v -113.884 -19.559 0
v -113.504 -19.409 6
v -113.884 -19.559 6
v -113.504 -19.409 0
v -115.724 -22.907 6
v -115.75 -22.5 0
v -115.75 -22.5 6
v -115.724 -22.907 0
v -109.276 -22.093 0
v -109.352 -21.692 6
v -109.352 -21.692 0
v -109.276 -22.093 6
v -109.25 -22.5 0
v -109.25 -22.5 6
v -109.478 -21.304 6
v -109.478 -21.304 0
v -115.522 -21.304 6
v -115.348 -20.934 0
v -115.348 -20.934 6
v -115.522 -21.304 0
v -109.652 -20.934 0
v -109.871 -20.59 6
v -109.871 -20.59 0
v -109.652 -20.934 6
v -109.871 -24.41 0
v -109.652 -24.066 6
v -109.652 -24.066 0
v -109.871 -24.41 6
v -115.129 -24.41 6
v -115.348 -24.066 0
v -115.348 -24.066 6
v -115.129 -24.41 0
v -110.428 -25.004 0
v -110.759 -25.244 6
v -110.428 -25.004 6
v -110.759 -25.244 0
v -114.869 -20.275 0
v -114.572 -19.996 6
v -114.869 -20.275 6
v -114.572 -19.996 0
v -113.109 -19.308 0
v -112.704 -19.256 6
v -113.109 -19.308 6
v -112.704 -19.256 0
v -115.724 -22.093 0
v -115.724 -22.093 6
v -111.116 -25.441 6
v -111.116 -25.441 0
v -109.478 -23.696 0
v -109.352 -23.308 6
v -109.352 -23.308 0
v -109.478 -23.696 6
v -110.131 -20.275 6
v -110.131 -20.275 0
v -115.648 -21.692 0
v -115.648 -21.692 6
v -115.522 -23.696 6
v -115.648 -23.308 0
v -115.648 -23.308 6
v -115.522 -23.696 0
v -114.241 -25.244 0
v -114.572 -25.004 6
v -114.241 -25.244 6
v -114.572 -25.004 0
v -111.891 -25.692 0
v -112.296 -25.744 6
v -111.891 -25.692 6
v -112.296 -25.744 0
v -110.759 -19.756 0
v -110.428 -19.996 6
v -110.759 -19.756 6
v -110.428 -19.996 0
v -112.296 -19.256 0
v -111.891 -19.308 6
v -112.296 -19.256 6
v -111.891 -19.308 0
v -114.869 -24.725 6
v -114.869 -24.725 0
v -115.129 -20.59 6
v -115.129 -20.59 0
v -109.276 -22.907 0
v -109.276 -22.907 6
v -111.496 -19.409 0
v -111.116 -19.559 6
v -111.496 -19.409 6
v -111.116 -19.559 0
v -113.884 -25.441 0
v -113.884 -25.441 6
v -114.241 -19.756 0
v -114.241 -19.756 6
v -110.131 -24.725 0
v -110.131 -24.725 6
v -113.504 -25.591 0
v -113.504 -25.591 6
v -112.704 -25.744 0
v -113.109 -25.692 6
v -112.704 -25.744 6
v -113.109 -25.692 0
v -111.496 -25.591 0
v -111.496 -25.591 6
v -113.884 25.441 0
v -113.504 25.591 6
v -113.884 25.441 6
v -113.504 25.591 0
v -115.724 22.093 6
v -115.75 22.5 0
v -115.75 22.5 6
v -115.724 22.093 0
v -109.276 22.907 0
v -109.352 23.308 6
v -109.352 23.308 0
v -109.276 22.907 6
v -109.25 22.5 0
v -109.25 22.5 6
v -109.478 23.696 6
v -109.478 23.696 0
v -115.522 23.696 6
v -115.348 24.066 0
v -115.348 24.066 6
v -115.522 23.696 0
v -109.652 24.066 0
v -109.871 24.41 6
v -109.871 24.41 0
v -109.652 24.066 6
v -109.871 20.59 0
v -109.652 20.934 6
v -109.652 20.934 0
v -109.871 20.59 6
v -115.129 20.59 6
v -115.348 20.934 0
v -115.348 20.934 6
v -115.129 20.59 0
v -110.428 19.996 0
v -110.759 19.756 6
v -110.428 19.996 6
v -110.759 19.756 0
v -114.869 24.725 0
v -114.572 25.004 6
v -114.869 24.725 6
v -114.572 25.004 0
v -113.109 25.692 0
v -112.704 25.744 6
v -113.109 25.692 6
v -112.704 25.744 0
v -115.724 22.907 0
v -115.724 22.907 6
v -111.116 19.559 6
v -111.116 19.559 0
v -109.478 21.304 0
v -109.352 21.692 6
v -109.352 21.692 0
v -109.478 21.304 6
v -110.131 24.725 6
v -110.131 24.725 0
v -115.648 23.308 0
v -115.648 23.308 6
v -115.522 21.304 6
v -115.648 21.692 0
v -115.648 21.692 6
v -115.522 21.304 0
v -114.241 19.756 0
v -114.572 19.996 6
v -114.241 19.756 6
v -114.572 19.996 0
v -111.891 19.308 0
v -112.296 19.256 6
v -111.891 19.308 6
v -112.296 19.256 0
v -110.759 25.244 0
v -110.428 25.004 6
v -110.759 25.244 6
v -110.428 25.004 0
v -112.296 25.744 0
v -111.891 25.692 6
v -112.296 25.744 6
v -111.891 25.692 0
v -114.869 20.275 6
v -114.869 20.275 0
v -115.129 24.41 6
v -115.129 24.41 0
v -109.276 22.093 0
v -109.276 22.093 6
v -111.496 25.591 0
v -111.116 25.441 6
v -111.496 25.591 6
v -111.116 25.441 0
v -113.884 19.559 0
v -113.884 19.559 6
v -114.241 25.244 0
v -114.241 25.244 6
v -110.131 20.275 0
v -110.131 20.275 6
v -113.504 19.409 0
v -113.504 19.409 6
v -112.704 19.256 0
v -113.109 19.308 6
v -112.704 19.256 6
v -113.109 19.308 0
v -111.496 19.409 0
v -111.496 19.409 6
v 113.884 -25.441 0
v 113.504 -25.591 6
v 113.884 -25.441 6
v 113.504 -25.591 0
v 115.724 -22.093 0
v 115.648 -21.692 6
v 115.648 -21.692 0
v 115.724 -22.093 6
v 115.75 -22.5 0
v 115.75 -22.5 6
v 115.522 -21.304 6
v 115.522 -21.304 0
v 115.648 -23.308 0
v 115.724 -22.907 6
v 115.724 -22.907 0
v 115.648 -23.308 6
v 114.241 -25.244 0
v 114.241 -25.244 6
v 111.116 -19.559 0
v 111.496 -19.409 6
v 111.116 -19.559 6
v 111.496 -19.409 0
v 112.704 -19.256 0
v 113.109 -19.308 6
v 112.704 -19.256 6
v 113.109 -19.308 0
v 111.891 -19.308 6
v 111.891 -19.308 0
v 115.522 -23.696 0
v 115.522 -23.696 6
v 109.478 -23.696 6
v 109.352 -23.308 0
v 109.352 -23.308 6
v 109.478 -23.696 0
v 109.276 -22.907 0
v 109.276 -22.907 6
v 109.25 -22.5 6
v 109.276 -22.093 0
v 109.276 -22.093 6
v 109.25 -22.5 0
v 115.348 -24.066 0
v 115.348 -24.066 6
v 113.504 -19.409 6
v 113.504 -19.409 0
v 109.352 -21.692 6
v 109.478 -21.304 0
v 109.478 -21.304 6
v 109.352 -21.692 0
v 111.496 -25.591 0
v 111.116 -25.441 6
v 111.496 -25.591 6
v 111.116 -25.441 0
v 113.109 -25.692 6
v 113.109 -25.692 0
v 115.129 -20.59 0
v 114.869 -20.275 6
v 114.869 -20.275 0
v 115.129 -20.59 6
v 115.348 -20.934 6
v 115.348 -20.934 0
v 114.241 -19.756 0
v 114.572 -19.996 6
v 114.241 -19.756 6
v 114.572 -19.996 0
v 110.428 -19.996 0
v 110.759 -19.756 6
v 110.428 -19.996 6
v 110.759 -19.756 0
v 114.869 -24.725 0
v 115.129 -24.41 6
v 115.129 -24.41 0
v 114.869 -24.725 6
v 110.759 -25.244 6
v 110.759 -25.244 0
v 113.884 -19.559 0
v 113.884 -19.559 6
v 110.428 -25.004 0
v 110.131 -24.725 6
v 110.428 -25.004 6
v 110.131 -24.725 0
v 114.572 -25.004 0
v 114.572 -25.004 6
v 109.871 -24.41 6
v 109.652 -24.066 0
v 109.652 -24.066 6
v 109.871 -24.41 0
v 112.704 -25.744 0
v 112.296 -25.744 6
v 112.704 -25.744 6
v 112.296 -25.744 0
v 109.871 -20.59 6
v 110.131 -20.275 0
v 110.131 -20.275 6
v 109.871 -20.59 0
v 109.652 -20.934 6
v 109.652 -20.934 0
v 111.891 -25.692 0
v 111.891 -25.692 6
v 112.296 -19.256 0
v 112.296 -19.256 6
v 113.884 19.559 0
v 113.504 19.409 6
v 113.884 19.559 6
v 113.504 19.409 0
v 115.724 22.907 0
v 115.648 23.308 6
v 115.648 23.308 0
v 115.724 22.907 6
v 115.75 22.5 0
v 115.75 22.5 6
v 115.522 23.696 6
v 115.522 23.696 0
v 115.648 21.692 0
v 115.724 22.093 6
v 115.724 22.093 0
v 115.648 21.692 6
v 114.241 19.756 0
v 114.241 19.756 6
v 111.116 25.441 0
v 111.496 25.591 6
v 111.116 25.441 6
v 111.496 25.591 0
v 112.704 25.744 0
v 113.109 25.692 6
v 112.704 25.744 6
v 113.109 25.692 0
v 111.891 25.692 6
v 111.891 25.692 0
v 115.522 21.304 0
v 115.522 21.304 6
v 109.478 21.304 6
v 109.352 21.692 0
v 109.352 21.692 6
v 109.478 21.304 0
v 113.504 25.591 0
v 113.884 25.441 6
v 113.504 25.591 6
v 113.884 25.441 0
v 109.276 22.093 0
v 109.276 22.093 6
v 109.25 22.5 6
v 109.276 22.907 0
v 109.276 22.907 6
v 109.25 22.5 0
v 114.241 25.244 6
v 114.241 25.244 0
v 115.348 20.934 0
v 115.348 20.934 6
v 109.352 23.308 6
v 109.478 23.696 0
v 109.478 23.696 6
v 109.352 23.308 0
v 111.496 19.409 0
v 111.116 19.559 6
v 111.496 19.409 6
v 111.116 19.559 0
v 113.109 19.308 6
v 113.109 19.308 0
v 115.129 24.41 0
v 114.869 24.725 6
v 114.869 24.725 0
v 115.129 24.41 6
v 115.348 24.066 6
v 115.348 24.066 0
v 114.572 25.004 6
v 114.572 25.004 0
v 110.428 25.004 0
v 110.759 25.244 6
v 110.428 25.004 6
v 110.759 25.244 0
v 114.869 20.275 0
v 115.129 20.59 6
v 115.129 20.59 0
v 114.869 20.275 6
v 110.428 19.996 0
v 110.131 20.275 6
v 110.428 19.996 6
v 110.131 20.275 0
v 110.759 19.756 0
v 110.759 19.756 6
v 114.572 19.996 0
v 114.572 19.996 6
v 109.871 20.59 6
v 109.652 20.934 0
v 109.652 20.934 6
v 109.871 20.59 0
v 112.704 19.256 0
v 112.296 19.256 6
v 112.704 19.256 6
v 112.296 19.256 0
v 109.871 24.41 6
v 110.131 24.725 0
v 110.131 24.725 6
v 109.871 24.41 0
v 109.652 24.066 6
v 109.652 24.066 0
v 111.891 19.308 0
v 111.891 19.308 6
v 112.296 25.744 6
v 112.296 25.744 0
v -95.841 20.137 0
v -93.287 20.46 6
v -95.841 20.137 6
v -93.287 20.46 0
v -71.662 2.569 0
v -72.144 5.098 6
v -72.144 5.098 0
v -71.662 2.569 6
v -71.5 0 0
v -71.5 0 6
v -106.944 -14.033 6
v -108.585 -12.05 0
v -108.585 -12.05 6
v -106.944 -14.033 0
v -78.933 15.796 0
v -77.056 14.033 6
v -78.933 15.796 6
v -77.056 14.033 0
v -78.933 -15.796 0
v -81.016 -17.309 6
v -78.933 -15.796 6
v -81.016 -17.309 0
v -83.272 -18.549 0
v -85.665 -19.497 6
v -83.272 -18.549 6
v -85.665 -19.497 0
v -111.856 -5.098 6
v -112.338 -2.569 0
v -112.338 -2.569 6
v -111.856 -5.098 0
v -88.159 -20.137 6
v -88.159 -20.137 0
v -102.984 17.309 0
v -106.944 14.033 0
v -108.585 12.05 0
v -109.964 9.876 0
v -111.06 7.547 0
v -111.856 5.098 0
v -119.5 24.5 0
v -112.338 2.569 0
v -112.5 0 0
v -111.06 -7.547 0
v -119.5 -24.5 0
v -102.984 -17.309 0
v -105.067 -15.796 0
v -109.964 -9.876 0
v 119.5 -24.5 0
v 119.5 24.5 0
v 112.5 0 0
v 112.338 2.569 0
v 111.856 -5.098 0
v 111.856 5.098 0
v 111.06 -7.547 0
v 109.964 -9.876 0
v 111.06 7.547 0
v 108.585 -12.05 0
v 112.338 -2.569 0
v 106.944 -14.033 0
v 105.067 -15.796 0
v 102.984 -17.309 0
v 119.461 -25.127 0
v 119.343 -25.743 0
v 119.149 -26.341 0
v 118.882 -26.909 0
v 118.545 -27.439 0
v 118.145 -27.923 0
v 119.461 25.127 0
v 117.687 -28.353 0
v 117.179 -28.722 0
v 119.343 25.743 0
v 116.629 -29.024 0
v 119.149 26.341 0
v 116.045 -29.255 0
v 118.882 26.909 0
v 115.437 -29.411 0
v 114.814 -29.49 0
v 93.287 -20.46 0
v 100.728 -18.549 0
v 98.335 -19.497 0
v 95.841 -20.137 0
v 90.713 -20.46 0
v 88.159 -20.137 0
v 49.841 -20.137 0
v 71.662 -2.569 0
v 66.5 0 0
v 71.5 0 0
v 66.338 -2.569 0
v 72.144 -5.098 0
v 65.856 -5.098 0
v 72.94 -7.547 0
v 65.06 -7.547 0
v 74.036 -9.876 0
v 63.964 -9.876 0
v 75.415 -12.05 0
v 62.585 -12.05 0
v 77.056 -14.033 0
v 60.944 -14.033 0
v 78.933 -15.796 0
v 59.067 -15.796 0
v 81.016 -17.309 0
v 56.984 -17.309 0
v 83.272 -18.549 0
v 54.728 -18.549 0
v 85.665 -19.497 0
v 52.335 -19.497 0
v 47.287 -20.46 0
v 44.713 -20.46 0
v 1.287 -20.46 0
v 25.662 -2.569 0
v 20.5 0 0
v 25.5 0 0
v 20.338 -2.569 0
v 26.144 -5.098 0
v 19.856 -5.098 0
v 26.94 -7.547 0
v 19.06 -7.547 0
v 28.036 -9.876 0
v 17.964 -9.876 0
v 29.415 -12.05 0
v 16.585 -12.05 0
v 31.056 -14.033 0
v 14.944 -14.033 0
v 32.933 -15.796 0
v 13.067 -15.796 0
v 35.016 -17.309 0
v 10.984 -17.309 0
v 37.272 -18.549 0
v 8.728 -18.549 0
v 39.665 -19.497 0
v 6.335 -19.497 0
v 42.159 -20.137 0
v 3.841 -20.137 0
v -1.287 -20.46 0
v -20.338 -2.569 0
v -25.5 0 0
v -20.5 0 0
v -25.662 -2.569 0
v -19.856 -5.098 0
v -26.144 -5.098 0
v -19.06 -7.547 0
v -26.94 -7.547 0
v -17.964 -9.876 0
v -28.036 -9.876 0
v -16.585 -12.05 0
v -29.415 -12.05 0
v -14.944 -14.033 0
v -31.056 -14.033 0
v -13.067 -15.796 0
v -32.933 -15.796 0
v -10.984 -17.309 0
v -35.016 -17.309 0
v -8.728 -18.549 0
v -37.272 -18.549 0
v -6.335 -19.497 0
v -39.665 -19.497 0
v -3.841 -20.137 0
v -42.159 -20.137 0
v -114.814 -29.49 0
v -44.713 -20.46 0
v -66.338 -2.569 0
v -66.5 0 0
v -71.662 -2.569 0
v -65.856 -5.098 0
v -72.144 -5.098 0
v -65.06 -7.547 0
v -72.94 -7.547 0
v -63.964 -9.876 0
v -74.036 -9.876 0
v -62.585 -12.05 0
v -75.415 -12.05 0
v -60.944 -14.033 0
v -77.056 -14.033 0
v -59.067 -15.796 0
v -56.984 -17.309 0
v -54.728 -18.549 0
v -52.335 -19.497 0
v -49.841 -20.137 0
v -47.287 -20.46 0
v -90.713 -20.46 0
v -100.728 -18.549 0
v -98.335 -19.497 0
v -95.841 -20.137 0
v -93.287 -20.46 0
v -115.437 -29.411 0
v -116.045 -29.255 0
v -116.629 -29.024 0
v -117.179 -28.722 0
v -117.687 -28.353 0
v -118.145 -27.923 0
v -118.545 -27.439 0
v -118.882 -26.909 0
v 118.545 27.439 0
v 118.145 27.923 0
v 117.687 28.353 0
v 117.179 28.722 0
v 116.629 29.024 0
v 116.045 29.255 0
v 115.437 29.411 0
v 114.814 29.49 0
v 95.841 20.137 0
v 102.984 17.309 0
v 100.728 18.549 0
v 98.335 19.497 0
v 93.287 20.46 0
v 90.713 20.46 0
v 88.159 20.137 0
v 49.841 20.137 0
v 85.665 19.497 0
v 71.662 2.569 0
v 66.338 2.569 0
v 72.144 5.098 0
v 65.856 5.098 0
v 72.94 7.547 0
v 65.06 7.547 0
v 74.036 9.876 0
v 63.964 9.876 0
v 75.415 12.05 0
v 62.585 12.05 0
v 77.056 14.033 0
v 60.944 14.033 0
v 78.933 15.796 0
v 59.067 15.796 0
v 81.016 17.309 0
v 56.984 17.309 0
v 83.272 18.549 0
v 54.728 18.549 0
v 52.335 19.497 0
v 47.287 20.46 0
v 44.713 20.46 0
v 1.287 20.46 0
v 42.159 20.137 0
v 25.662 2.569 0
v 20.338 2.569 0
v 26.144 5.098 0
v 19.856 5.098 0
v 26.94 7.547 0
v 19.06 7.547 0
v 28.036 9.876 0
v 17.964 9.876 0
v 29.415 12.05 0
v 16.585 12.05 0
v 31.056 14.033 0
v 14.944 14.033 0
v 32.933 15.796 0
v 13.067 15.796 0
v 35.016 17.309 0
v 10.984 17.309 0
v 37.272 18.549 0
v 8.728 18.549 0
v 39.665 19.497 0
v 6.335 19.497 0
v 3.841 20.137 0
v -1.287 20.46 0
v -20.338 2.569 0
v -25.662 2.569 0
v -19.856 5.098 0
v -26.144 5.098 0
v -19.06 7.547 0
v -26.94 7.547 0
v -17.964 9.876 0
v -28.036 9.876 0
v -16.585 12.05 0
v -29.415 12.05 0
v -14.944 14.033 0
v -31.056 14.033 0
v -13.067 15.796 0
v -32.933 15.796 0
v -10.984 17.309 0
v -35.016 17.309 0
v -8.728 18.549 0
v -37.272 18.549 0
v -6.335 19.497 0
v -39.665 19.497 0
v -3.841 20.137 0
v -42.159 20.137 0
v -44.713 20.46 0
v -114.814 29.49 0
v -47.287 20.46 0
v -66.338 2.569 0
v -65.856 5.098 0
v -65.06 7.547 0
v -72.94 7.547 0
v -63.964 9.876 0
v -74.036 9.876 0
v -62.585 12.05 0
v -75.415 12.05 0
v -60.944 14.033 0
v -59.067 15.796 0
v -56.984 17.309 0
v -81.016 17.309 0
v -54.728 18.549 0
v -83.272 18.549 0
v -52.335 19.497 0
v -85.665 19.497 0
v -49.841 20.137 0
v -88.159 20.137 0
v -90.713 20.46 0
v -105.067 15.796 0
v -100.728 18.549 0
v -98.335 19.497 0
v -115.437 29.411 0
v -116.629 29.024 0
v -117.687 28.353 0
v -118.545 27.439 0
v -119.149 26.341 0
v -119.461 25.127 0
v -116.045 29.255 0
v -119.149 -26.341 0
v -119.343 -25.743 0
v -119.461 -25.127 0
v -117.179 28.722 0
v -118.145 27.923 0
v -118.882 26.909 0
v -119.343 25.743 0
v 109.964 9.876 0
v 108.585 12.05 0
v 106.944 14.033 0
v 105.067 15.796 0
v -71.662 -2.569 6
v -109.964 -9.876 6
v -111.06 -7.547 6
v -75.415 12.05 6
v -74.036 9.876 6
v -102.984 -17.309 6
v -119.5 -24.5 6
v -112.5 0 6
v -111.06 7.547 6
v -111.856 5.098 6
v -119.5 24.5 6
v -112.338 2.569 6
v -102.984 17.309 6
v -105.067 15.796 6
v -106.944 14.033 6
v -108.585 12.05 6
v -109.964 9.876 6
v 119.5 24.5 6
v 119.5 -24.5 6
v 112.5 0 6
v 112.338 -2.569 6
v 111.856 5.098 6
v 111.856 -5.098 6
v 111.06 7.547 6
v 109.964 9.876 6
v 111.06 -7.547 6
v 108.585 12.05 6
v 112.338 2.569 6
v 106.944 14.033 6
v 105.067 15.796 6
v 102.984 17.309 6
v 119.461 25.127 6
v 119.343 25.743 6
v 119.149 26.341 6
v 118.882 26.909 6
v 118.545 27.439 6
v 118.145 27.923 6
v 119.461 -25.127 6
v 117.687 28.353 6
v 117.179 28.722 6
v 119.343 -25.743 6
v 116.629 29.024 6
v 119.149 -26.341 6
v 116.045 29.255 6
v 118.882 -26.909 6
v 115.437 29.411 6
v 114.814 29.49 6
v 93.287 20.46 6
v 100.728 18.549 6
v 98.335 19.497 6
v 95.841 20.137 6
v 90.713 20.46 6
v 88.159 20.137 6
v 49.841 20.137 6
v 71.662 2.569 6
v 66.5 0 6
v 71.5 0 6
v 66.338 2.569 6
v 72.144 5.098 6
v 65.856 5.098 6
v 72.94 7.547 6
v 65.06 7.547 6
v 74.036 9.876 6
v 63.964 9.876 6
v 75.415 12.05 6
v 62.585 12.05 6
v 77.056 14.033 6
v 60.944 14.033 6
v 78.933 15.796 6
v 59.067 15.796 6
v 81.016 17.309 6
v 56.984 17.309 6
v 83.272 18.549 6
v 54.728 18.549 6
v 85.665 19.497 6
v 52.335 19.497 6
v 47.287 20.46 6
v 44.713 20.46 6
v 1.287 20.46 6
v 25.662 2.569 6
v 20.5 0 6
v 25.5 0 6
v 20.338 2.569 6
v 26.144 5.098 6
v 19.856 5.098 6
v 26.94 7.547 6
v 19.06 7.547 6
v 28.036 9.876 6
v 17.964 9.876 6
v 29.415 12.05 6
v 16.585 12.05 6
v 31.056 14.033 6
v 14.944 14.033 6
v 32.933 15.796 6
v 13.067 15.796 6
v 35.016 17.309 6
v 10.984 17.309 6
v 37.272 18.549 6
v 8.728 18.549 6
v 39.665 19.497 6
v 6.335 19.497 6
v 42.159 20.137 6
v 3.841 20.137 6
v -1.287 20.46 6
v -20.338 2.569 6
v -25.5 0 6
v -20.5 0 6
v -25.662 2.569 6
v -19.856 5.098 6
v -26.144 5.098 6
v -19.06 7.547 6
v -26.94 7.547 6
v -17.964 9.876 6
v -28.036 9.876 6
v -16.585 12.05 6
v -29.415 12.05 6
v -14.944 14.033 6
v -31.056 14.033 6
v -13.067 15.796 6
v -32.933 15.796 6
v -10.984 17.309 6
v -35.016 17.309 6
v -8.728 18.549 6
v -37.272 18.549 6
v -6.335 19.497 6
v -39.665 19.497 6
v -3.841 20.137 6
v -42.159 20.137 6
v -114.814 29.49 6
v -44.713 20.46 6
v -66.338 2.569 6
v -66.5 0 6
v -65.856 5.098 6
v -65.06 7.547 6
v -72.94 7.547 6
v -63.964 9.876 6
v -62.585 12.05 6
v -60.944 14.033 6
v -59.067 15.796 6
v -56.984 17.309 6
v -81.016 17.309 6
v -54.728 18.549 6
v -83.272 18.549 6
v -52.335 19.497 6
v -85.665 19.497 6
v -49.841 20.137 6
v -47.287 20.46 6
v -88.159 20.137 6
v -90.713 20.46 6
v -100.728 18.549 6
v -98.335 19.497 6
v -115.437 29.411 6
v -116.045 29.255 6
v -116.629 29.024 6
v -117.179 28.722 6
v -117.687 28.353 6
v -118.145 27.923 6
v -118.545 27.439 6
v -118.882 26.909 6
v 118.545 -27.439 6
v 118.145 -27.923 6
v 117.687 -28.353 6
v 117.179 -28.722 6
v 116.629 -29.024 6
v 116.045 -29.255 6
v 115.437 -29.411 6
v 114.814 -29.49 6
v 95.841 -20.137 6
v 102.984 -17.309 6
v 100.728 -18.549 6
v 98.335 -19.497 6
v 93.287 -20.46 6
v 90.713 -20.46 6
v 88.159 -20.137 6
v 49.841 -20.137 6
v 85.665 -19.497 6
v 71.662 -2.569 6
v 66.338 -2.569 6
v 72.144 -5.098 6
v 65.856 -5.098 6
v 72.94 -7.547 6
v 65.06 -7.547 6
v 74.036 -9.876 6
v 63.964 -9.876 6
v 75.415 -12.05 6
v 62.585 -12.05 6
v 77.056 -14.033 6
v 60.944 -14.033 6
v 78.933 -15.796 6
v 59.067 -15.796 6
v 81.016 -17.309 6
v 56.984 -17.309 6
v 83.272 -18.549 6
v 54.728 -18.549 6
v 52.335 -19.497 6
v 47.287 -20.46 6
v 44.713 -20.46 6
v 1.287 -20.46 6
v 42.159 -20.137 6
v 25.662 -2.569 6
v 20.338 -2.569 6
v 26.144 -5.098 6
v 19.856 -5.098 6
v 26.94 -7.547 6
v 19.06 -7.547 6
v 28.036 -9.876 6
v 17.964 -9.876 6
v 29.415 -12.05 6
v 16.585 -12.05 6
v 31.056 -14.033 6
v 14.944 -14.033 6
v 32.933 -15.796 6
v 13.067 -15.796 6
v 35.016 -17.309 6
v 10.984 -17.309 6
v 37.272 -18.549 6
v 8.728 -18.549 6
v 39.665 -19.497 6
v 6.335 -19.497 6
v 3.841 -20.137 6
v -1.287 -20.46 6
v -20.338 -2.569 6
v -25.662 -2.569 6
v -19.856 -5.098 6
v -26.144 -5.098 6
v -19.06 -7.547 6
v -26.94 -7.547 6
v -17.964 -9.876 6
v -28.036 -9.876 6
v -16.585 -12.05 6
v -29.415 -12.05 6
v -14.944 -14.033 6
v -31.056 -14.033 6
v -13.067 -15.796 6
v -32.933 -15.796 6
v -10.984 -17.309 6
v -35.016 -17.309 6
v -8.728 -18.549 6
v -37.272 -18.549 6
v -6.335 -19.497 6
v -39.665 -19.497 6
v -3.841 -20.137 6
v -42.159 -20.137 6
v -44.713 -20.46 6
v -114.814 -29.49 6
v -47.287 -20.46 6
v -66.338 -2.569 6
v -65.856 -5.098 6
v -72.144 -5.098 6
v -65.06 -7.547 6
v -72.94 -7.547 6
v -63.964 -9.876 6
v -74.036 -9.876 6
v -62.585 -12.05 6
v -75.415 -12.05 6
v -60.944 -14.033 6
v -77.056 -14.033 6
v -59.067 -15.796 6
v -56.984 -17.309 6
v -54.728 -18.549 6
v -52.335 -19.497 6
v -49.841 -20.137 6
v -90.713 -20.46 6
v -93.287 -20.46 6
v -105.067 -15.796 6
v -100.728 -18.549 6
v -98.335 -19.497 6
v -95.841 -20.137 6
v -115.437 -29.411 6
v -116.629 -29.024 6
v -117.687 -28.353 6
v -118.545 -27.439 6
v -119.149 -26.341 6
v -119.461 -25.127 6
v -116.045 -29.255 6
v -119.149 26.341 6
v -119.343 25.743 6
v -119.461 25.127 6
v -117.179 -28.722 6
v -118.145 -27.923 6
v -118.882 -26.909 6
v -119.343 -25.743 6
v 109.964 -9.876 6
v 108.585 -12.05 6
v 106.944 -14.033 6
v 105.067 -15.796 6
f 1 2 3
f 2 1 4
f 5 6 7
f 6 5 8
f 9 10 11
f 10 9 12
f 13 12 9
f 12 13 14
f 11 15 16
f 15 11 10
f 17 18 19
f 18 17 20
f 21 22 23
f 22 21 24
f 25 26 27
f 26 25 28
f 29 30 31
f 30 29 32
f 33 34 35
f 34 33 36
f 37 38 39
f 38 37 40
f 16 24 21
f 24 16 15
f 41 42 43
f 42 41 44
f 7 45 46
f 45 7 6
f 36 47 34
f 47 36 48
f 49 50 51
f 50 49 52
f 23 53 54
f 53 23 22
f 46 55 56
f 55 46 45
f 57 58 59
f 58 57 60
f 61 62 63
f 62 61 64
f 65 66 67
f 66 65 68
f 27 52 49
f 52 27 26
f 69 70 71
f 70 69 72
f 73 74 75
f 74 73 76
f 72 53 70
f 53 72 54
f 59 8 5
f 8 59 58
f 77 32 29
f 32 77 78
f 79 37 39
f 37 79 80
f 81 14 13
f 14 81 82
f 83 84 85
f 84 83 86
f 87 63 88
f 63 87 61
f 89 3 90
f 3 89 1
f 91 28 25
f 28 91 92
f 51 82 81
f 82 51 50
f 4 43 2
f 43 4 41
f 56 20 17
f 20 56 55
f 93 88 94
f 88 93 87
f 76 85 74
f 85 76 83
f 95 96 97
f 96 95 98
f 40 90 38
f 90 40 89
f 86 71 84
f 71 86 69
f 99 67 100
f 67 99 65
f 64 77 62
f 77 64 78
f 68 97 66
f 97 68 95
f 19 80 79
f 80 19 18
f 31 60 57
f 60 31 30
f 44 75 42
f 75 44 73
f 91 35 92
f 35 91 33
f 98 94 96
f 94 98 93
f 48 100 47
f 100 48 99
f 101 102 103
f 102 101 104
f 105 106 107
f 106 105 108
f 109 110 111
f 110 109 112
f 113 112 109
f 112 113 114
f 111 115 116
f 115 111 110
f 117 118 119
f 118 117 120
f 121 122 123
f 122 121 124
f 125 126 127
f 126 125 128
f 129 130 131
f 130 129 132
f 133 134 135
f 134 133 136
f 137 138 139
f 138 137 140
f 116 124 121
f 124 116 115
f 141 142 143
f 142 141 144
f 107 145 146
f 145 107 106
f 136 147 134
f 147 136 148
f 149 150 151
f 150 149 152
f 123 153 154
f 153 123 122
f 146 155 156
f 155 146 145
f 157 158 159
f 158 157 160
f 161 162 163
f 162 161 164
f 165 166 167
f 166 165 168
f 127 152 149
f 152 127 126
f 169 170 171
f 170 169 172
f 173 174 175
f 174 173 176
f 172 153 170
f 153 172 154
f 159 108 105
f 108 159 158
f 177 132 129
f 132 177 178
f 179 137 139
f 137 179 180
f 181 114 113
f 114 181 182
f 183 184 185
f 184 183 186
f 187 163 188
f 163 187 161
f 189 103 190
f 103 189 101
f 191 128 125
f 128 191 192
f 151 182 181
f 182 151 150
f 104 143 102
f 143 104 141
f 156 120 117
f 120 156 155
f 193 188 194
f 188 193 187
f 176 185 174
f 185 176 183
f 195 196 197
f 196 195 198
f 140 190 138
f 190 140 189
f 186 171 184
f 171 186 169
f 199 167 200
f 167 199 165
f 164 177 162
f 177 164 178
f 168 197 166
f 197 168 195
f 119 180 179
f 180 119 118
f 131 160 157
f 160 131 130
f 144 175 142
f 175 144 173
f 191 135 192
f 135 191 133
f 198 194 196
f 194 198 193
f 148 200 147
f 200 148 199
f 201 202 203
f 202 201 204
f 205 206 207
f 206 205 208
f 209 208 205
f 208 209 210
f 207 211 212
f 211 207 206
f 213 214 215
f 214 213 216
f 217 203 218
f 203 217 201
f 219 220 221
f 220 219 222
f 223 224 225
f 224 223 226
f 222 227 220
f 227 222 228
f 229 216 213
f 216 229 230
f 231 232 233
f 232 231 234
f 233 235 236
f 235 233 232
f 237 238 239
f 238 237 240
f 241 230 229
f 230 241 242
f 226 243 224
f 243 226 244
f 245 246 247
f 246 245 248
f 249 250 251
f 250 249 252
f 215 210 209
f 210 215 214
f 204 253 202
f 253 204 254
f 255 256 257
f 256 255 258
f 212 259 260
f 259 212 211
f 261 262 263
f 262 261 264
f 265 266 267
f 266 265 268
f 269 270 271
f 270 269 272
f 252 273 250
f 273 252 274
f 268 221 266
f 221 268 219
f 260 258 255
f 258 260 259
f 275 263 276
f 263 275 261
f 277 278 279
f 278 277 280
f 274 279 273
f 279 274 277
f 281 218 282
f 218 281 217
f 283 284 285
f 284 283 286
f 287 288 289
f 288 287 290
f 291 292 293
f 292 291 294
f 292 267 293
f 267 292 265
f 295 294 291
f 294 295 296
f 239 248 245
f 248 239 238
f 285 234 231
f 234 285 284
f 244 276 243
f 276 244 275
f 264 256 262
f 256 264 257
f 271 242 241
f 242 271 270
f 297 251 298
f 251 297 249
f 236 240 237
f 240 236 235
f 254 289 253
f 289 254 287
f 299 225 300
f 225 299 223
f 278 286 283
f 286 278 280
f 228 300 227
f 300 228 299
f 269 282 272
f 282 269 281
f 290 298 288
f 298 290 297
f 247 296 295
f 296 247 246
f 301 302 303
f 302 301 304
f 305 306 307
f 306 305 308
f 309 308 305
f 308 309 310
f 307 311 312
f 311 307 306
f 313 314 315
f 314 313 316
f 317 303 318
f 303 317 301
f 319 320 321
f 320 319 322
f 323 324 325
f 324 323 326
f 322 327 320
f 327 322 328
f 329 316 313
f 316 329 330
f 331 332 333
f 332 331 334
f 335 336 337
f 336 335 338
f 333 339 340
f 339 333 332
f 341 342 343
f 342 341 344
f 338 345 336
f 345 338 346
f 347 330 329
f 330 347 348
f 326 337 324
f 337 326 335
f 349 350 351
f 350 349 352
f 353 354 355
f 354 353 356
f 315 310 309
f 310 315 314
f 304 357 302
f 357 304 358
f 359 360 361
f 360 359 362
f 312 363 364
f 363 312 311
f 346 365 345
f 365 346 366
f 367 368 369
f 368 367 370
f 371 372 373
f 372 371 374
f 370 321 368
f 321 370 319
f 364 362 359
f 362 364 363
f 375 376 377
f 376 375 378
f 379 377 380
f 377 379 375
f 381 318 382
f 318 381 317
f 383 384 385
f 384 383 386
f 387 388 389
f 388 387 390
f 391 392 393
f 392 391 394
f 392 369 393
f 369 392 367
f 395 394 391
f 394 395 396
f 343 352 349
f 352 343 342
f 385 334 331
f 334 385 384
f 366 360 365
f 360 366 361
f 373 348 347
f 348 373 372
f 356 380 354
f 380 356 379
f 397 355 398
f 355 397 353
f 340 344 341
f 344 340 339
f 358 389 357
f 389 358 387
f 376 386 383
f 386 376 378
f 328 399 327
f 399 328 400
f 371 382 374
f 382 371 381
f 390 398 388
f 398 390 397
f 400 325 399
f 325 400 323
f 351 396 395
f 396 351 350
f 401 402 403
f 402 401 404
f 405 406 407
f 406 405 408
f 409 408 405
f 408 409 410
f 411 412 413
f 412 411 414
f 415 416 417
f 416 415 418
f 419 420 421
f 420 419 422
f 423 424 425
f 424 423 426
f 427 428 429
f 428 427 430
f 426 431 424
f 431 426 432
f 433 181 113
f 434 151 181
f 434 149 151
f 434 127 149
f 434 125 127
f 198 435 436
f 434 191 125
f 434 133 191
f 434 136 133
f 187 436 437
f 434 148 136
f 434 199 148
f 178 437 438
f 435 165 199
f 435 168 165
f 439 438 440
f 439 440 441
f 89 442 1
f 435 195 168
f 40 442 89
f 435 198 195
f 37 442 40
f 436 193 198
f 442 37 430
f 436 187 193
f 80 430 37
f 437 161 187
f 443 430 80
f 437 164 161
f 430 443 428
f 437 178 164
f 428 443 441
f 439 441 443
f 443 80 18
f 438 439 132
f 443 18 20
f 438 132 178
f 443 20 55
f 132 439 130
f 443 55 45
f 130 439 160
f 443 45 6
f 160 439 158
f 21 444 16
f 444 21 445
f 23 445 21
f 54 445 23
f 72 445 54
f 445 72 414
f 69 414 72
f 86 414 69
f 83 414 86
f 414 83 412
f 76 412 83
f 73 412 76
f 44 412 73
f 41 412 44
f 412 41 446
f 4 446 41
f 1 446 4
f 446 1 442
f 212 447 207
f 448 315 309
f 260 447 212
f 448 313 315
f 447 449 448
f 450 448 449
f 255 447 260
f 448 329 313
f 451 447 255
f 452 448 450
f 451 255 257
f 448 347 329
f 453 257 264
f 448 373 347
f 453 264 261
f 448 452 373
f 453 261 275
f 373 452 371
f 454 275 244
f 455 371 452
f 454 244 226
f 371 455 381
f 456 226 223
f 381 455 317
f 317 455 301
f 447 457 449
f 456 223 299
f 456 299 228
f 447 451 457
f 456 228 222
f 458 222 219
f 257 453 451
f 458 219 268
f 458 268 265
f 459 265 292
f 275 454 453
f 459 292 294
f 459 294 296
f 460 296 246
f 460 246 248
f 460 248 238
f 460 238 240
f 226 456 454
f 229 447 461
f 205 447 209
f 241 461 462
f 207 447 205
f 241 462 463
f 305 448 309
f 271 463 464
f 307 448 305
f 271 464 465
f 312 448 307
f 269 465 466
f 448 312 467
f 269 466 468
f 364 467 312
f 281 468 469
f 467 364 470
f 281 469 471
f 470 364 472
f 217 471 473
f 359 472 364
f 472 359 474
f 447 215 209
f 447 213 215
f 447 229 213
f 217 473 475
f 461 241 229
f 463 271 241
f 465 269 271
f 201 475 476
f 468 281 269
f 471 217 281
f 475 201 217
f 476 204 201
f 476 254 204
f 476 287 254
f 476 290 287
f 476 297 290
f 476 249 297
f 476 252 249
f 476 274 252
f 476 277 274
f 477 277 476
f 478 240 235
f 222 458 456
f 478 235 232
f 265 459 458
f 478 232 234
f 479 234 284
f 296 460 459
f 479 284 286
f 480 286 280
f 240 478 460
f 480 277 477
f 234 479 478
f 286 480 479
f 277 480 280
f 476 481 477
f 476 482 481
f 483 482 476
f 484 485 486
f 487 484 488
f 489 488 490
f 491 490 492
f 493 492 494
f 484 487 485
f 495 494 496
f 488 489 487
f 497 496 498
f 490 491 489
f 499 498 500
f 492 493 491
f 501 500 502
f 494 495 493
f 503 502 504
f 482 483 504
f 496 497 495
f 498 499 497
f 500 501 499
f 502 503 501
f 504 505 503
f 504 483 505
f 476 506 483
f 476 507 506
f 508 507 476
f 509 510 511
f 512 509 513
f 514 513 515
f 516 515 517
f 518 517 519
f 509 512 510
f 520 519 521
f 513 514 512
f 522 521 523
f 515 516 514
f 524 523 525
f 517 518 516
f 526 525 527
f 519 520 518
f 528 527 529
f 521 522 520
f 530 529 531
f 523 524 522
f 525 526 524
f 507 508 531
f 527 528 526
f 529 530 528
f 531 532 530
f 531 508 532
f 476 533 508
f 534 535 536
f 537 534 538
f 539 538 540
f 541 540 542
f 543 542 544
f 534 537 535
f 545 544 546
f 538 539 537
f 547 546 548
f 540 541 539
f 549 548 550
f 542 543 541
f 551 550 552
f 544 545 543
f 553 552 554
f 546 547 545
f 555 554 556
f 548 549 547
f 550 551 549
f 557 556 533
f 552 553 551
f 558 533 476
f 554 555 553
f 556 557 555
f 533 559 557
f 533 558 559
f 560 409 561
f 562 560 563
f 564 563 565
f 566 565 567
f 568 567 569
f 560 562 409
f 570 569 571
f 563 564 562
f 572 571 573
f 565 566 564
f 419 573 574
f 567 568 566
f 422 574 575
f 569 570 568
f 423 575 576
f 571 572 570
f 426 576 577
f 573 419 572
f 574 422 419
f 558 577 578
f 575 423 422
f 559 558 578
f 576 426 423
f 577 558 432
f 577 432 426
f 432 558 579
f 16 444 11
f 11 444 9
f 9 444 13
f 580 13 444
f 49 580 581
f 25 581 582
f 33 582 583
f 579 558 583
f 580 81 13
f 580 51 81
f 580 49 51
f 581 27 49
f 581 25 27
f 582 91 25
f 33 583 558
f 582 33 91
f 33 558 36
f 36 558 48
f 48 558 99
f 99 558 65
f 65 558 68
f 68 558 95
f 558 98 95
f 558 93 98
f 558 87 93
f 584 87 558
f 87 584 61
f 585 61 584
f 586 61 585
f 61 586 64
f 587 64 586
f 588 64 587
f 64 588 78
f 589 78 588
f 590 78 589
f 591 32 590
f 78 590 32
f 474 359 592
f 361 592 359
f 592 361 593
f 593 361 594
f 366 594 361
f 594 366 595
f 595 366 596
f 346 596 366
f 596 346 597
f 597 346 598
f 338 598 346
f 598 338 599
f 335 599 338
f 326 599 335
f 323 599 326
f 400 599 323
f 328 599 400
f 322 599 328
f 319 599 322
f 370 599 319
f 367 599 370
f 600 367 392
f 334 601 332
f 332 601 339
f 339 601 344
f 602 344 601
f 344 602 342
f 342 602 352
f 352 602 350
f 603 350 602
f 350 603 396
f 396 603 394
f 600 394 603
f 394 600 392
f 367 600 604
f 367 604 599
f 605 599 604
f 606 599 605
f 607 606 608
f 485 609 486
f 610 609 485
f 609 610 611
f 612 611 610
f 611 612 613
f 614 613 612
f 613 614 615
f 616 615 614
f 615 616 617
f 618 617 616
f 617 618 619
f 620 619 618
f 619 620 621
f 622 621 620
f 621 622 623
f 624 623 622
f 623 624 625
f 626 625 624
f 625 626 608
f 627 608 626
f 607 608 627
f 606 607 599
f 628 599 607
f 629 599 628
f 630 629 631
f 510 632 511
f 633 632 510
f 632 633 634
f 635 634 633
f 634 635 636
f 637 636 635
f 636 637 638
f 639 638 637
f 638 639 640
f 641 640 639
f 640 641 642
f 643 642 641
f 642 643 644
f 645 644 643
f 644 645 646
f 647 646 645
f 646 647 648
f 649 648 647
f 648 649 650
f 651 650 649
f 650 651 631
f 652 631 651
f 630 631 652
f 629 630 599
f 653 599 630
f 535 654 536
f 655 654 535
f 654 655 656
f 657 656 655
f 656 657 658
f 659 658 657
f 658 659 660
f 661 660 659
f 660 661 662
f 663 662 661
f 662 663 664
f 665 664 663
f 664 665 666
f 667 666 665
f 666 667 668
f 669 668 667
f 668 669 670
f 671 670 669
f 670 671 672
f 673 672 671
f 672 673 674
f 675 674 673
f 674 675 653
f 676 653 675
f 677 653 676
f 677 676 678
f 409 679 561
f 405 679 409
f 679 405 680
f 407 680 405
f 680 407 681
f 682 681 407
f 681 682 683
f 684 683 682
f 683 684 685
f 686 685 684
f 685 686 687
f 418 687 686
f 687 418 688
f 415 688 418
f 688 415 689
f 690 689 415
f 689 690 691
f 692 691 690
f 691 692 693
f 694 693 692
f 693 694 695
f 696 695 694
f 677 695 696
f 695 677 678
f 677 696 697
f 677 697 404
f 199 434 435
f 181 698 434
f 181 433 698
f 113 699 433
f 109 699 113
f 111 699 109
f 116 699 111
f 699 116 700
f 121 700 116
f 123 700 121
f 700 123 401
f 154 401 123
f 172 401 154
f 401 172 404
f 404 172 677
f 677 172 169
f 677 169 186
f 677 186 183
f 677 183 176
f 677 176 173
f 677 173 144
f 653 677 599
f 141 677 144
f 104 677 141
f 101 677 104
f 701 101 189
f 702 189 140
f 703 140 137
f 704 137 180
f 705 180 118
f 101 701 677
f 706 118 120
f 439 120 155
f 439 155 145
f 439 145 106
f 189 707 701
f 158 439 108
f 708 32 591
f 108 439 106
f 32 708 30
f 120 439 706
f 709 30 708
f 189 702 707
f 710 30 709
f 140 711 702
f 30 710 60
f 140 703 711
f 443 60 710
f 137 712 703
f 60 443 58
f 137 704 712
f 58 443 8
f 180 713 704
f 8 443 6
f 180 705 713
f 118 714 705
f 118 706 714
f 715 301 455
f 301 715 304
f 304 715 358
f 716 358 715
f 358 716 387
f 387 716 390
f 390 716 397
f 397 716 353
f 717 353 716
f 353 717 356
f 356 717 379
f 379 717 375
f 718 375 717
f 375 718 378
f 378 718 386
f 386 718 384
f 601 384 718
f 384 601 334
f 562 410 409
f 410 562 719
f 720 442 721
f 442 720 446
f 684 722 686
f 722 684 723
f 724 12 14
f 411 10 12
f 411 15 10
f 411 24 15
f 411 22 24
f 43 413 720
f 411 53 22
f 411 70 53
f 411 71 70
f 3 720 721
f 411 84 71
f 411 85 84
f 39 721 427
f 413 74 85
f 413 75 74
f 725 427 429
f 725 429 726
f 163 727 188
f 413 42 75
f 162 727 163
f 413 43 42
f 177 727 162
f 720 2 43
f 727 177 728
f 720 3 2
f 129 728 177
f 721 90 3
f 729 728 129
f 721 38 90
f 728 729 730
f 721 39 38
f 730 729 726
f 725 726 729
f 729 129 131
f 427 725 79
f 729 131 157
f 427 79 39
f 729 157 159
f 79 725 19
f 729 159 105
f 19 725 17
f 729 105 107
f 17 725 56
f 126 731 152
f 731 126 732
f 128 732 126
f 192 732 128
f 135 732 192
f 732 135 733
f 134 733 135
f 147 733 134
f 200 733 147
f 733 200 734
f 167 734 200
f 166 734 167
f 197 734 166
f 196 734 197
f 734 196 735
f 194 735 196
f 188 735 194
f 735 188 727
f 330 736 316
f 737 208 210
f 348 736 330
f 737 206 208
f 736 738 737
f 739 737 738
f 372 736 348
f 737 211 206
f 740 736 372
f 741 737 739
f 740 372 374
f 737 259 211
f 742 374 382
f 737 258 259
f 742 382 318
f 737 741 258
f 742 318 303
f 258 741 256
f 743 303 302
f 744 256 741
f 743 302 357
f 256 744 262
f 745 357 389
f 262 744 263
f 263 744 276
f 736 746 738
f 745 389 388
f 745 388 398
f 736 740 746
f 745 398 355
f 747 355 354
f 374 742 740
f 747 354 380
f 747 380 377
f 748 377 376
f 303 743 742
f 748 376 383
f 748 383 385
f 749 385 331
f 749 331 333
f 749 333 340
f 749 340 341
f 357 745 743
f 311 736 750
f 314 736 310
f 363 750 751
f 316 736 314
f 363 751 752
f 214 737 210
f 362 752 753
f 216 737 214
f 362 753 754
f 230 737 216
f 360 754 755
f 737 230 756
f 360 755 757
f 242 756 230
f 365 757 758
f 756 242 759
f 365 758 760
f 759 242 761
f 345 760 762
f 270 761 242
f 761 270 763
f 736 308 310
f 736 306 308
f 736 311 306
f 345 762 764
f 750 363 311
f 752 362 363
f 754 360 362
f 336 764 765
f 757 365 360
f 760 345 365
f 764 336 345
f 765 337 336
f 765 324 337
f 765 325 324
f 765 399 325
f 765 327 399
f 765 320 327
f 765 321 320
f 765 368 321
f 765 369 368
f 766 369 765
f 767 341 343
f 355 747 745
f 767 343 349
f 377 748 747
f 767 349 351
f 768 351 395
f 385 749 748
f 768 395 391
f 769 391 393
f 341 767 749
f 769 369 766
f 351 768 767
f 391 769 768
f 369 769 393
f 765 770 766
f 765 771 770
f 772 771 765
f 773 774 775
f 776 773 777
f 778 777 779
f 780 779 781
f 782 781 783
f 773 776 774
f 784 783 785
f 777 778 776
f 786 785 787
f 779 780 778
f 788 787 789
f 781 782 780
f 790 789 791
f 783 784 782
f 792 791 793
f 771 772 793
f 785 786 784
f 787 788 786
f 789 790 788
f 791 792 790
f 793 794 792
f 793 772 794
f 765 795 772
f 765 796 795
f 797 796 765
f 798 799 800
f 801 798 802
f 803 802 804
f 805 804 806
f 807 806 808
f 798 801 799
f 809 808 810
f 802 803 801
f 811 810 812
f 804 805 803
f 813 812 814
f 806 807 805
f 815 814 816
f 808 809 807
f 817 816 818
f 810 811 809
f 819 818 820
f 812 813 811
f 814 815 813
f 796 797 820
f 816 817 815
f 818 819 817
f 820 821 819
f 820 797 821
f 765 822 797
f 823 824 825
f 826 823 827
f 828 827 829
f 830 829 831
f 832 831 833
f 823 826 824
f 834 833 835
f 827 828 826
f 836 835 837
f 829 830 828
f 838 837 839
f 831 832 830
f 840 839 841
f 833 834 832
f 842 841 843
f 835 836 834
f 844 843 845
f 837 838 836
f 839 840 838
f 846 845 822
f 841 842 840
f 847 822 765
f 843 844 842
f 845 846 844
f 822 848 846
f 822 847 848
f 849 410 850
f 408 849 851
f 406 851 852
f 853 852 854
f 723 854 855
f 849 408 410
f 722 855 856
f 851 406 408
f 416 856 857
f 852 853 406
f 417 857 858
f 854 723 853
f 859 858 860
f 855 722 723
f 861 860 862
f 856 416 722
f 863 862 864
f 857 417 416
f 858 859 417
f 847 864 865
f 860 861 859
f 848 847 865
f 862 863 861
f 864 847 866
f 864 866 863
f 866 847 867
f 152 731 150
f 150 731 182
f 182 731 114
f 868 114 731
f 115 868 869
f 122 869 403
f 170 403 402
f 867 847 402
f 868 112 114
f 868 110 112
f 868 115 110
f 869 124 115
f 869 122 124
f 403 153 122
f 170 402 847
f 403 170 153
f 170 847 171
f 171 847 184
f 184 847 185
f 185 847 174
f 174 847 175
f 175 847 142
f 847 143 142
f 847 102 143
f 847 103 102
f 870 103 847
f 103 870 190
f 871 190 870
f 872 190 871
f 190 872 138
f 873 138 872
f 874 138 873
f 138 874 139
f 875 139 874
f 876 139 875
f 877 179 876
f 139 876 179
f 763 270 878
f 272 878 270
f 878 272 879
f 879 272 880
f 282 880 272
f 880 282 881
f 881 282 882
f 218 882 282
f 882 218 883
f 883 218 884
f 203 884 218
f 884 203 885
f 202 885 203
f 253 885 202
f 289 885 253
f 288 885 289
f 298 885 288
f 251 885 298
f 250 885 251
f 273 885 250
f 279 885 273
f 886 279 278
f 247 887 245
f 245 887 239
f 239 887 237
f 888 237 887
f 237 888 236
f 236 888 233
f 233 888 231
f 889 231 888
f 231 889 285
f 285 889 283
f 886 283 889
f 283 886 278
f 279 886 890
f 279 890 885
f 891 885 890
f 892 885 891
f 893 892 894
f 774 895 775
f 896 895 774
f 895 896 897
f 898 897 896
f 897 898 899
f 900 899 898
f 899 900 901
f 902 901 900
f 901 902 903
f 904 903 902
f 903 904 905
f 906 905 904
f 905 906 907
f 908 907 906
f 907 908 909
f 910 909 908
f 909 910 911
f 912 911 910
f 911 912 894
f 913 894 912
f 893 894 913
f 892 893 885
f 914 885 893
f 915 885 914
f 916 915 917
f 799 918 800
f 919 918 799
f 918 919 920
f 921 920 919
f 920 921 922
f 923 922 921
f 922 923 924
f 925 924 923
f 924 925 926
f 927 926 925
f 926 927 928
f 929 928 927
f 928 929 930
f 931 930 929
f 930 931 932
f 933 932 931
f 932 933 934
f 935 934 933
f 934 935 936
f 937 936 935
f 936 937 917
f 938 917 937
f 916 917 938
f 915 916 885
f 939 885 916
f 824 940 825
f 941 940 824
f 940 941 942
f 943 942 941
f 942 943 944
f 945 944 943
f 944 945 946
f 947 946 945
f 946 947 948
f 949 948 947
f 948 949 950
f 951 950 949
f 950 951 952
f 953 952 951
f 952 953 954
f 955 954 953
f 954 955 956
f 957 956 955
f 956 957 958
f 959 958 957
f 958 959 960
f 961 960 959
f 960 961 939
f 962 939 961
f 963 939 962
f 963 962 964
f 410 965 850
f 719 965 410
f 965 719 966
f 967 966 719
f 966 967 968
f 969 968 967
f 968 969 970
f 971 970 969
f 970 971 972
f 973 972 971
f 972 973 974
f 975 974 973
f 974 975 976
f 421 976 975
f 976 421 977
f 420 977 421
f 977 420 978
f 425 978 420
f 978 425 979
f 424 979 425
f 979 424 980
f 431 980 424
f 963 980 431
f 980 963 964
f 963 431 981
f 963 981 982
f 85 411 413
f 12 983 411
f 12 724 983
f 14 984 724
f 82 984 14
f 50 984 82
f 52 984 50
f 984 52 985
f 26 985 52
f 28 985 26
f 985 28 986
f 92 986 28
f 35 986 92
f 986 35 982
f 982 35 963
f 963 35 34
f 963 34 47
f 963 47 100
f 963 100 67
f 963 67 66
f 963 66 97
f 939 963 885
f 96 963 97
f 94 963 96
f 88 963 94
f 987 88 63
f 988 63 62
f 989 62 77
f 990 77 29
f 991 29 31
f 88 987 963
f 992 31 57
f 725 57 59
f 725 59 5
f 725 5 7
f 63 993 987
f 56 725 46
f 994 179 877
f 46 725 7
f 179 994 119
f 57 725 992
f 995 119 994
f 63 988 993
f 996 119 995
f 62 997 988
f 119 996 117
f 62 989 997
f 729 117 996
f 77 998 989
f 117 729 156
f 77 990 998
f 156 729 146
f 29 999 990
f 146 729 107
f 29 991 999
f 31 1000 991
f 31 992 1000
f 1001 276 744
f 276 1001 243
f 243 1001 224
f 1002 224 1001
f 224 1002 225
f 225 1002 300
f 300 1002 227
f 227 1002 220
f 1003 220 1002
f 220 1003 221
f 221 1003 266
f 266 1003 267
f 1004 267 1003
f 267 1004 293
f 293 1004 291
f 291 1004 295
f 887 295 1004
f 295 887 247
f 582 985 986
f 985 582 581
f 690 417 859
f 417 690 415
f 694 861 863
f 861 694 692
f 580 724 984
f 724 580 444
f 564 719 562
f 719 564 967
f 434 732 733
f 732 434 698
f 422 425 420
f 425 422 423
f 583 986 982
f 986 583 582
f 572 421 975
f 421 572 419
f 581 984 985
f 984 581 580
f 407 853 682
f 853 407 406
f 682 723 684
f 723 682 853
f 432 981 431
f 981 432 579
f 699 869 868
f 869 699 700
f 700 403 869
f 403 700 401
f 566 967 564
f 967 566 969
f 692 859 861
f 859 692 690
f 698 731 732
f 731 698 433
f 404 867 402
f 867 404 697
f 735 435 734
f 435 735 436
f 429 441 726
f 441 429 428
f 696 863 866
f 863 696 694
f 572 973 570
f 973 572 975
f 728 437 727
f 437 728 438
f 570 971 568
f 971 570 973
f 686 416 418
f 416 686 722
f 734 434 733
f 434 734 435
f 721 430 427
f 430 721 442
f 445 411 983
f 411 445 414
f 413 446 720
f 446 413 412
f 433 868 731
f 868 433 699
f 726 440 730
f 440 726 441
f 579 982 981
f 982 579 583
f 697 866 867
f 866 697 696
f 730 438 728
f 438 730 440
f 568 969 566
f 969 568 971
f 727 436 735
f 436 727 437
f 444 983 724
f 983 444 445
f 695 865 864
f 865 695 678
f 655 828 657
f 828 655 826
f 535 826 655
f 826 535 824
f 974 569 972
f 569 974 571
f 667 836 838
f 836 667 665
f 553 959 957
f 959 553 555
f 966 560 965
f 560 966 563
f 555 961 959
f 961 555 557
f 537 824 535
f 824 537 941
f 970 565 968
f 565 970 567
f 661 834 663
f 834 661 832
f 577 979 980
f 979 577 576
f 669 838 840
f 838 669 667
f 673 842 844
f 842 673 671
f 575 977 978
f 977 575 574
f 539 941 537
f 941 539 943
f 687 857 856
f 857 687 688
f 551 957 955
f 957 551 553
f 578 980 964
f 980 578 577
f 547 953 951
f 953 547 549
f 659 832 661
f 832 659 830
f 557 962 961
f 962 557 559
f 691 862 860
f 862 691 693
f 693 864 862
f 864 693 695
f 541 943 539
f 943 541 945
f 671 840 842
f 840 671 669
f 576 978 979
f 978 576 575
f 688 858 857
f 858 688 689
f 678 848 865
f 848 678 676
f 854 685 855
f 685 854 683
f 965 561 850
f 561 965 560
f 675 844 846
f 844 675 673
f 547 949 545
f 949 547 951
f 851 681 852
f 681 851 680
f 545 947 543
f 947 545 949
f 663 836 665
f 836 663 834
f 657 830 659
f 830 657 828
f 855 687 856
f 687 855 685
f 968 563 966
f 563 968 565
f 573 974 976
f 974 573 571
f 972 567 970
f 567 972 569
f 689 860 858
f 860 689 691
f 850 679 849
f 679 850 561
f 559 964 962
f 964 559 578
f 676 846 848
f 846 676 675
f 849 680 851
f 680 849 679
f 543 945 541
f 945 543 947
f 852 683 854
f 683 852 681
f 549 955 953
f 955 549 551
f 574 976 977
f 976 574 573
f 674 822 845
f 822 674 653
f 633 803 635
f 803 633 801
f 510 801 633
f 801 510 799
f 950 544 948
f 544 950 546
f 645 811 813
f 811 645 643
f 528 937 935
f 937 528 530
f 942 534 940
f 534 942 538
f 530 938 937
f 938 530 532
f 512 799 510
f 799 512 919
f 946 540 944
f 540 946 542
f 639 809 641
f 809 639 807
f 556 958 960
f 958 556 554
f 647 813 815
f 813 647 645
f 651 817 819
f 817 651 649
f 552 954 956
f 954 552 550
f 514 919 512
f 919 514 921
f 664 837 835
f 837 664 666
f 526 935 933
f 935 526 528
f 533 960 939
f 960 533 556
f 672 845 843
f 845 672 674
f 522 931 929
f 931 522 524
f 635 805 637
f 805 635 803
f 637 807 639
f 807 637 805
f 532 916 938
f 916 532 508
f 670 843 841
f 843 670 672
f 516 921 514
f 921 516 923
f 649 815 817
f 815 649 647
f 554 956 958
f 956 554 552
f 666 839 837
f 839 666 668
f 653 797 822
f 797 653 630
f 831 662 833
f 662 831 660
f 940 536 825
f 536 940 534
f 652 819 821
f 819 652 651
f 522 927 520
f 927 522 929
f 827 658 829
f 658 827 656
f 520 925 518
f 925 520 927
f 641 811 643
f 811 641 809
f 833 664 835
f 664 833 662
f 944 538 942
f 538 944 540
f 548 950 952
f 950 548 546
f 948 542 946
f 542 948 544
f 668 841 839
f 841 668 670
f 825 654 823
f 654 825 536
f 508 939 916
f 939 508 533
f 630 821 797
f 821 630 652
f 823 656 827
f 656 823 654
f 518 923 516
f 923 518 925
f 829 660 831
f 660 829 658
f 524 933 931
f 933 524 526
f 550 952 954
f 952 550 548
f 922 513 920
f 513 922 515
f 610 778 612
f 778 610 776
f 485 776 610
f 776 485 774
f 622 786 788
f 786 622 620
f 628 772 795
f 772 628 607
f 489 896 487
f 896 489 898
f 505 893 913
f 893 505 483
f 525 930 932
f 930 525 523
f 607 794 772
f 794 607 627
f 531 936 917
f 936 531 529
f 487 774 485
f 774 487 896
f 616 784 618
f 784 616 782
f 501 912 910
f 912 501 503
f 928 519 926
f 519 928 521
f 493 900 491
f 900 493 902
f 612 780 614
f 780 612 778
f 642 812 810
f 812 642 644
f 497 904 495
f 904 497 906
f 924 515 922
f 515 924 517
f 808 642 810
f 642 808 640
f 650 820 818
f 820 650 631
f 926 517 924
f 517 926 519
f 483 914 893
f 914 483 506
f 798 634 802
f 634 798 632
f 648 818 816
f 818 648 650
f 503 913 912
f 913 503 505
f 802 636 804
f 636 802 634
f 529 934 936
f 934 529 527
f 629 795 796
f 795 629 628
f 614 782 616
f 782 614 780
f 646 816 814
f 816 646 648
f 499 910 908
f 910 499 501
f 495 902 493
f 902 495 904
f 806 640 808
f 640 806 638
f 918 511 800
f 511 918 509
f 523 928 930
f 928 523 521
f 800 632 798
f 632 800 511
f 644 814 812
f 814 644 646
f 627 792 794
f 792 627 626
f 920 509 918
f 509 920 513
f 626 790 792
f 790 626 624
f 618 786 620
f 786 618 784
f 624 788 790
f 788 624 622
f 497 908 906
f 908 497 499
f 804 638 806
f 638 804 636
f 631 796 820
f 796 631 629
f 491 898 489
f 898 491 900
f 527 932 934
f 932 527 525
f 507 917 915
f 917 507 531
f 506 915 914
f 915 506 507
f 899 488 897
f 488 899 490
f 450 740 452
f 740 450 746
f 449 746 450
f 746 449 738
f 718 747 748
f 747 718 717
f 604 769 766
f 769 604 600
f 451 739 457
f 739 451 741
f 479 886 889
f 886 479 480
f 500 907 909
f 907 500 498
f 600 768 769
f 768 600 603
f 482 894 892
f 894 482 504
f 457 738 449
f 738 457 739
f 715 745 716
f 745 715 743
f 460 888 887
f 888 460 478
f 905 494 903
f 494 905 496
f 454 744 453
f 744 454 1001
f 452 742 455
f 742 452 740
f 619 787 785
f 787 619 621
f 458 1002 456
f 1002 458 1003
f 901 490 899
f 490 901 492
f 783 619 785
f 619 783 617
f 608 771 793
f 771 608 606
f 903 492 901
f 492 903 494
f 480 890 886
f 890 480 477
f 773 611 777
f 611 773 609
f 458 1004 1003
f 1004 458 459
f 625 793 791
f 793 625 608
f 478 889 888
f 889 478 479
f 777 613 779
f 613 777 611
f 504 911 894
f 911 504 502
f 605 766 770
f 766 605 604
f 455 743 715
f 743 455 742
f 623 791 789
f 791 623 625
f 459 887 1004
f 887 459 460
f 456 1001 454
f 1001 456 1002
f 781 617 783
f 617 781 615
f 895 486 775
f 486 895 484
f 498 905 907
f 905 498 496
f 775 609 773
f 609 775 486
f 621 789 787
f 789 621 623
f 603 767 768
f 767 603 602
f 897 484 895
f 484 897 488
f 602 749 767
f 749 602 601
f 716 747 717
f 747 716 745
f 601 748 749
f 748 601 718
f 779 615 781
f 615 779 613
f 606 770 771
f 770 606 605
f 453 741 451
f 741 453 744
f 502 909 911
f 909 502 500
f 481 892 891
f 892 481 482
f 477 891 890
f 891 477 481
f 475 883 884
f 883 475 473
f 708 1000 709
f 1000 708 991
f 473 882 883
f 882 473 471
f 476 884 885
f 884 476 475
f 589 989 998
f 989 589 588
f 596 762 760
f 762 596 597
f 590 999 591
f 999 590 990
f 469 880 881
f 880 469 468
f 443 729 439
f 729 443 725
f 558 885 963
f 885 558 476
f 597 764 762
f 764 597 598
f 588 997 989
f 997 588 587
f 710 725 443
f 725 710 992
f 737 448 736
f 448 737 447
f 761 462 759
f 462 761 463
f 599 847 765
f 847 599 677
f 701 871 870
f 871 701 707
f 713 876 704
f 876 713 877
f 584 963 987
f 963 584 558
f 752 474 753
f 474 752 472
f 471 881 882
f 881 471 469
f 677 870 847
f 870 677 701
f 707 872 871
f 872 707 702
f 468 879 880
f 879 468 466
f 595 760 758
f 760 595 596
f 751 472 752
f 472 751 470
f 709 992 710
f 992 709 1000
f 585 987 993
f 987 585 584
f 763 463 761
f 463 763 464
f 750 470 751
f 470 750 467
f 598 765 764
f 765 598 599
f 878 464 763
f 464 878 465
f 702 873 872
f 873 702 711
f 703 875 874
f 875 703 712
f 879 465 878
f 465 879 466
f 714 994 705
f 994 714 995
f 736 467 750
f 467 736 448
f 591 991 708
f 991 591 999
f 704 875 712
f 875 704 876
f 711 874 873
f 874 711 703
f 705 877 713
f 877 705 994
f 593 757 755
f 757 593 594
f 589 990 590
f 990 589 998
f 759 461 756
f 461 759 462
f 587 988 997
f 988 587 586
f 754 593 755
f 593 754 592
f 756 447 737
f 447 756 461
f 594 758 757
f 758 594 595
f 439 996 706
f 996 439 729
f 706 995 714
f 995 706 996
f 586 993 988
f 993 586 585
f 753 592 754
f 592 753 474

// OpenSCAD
$fn = 50;

difference() {
	union() {
		hull() {
			translate(v = [-114.5, 24.5, 0]) {
				cylinder(h = 6, r = 5);
			}
			translate(v = [114.5, 24.5, 0]) {
				cylinder(h = 6, r = 5);
			}
			translate(v = [-114.5, -24.5, 0]) {
				cylinder(h = 6, r = 5);
			}
			translate(v = [114.5, -24.5, 0]) {
				cylinder(h = 6, r = 5);
			}
		}
	}
	union() {
		translate(v = [-112.5, -22.5, -100.0]) {
			cylinder(h = 200, r = 3.25);
		}
		translate(v = [-112.5, 22.5, -100.0]) {
			cylinder(h = 200, r = 3.25);
		}
		translate(v = [112.5, -22.5, -100.0]) {
			cylinder(h = 200, r = 3.25);
		}
		translate(v = [112.5, 22.5, -100.0]) {
			cylinder(h = 200, r = 3.25);
		}
		translate(v = [-112.5, -22.5, -100.0]) {
			cylinder(h = 200, r = 1.8);
		}
		translate(v = [-112.5, 22.5, -100.0]) {
			cylinder(h = 200, r = 1.8);
		}
		translate(v = [112.5, -22.5, -100.0]) {
			cylinder(h = 200, r = 1.8);
		}
		translate(v = [112.5, 22.5, -100.0]) {
			cylinder(h = 200, r = 1.8);
		}
		translate(v = [-92.0, 0, 0.0]) {
			cylinder(h = 6, r = 20.5);
		}
		translate(v = [-46.0, 0, 0.0]) {
			cylinder(h = 6, r = 20.5);
		}
		cylinder(h = 6, r = 20.5);
		translate(v = [46.0, 0, 0.0]) {
			cylinder(h = 6, r = 20.5);
		}
		translate(v = [92.0, 0, 0.0]) {
			cylinder(h = 6, r = 20.5);
		}
	}
}
